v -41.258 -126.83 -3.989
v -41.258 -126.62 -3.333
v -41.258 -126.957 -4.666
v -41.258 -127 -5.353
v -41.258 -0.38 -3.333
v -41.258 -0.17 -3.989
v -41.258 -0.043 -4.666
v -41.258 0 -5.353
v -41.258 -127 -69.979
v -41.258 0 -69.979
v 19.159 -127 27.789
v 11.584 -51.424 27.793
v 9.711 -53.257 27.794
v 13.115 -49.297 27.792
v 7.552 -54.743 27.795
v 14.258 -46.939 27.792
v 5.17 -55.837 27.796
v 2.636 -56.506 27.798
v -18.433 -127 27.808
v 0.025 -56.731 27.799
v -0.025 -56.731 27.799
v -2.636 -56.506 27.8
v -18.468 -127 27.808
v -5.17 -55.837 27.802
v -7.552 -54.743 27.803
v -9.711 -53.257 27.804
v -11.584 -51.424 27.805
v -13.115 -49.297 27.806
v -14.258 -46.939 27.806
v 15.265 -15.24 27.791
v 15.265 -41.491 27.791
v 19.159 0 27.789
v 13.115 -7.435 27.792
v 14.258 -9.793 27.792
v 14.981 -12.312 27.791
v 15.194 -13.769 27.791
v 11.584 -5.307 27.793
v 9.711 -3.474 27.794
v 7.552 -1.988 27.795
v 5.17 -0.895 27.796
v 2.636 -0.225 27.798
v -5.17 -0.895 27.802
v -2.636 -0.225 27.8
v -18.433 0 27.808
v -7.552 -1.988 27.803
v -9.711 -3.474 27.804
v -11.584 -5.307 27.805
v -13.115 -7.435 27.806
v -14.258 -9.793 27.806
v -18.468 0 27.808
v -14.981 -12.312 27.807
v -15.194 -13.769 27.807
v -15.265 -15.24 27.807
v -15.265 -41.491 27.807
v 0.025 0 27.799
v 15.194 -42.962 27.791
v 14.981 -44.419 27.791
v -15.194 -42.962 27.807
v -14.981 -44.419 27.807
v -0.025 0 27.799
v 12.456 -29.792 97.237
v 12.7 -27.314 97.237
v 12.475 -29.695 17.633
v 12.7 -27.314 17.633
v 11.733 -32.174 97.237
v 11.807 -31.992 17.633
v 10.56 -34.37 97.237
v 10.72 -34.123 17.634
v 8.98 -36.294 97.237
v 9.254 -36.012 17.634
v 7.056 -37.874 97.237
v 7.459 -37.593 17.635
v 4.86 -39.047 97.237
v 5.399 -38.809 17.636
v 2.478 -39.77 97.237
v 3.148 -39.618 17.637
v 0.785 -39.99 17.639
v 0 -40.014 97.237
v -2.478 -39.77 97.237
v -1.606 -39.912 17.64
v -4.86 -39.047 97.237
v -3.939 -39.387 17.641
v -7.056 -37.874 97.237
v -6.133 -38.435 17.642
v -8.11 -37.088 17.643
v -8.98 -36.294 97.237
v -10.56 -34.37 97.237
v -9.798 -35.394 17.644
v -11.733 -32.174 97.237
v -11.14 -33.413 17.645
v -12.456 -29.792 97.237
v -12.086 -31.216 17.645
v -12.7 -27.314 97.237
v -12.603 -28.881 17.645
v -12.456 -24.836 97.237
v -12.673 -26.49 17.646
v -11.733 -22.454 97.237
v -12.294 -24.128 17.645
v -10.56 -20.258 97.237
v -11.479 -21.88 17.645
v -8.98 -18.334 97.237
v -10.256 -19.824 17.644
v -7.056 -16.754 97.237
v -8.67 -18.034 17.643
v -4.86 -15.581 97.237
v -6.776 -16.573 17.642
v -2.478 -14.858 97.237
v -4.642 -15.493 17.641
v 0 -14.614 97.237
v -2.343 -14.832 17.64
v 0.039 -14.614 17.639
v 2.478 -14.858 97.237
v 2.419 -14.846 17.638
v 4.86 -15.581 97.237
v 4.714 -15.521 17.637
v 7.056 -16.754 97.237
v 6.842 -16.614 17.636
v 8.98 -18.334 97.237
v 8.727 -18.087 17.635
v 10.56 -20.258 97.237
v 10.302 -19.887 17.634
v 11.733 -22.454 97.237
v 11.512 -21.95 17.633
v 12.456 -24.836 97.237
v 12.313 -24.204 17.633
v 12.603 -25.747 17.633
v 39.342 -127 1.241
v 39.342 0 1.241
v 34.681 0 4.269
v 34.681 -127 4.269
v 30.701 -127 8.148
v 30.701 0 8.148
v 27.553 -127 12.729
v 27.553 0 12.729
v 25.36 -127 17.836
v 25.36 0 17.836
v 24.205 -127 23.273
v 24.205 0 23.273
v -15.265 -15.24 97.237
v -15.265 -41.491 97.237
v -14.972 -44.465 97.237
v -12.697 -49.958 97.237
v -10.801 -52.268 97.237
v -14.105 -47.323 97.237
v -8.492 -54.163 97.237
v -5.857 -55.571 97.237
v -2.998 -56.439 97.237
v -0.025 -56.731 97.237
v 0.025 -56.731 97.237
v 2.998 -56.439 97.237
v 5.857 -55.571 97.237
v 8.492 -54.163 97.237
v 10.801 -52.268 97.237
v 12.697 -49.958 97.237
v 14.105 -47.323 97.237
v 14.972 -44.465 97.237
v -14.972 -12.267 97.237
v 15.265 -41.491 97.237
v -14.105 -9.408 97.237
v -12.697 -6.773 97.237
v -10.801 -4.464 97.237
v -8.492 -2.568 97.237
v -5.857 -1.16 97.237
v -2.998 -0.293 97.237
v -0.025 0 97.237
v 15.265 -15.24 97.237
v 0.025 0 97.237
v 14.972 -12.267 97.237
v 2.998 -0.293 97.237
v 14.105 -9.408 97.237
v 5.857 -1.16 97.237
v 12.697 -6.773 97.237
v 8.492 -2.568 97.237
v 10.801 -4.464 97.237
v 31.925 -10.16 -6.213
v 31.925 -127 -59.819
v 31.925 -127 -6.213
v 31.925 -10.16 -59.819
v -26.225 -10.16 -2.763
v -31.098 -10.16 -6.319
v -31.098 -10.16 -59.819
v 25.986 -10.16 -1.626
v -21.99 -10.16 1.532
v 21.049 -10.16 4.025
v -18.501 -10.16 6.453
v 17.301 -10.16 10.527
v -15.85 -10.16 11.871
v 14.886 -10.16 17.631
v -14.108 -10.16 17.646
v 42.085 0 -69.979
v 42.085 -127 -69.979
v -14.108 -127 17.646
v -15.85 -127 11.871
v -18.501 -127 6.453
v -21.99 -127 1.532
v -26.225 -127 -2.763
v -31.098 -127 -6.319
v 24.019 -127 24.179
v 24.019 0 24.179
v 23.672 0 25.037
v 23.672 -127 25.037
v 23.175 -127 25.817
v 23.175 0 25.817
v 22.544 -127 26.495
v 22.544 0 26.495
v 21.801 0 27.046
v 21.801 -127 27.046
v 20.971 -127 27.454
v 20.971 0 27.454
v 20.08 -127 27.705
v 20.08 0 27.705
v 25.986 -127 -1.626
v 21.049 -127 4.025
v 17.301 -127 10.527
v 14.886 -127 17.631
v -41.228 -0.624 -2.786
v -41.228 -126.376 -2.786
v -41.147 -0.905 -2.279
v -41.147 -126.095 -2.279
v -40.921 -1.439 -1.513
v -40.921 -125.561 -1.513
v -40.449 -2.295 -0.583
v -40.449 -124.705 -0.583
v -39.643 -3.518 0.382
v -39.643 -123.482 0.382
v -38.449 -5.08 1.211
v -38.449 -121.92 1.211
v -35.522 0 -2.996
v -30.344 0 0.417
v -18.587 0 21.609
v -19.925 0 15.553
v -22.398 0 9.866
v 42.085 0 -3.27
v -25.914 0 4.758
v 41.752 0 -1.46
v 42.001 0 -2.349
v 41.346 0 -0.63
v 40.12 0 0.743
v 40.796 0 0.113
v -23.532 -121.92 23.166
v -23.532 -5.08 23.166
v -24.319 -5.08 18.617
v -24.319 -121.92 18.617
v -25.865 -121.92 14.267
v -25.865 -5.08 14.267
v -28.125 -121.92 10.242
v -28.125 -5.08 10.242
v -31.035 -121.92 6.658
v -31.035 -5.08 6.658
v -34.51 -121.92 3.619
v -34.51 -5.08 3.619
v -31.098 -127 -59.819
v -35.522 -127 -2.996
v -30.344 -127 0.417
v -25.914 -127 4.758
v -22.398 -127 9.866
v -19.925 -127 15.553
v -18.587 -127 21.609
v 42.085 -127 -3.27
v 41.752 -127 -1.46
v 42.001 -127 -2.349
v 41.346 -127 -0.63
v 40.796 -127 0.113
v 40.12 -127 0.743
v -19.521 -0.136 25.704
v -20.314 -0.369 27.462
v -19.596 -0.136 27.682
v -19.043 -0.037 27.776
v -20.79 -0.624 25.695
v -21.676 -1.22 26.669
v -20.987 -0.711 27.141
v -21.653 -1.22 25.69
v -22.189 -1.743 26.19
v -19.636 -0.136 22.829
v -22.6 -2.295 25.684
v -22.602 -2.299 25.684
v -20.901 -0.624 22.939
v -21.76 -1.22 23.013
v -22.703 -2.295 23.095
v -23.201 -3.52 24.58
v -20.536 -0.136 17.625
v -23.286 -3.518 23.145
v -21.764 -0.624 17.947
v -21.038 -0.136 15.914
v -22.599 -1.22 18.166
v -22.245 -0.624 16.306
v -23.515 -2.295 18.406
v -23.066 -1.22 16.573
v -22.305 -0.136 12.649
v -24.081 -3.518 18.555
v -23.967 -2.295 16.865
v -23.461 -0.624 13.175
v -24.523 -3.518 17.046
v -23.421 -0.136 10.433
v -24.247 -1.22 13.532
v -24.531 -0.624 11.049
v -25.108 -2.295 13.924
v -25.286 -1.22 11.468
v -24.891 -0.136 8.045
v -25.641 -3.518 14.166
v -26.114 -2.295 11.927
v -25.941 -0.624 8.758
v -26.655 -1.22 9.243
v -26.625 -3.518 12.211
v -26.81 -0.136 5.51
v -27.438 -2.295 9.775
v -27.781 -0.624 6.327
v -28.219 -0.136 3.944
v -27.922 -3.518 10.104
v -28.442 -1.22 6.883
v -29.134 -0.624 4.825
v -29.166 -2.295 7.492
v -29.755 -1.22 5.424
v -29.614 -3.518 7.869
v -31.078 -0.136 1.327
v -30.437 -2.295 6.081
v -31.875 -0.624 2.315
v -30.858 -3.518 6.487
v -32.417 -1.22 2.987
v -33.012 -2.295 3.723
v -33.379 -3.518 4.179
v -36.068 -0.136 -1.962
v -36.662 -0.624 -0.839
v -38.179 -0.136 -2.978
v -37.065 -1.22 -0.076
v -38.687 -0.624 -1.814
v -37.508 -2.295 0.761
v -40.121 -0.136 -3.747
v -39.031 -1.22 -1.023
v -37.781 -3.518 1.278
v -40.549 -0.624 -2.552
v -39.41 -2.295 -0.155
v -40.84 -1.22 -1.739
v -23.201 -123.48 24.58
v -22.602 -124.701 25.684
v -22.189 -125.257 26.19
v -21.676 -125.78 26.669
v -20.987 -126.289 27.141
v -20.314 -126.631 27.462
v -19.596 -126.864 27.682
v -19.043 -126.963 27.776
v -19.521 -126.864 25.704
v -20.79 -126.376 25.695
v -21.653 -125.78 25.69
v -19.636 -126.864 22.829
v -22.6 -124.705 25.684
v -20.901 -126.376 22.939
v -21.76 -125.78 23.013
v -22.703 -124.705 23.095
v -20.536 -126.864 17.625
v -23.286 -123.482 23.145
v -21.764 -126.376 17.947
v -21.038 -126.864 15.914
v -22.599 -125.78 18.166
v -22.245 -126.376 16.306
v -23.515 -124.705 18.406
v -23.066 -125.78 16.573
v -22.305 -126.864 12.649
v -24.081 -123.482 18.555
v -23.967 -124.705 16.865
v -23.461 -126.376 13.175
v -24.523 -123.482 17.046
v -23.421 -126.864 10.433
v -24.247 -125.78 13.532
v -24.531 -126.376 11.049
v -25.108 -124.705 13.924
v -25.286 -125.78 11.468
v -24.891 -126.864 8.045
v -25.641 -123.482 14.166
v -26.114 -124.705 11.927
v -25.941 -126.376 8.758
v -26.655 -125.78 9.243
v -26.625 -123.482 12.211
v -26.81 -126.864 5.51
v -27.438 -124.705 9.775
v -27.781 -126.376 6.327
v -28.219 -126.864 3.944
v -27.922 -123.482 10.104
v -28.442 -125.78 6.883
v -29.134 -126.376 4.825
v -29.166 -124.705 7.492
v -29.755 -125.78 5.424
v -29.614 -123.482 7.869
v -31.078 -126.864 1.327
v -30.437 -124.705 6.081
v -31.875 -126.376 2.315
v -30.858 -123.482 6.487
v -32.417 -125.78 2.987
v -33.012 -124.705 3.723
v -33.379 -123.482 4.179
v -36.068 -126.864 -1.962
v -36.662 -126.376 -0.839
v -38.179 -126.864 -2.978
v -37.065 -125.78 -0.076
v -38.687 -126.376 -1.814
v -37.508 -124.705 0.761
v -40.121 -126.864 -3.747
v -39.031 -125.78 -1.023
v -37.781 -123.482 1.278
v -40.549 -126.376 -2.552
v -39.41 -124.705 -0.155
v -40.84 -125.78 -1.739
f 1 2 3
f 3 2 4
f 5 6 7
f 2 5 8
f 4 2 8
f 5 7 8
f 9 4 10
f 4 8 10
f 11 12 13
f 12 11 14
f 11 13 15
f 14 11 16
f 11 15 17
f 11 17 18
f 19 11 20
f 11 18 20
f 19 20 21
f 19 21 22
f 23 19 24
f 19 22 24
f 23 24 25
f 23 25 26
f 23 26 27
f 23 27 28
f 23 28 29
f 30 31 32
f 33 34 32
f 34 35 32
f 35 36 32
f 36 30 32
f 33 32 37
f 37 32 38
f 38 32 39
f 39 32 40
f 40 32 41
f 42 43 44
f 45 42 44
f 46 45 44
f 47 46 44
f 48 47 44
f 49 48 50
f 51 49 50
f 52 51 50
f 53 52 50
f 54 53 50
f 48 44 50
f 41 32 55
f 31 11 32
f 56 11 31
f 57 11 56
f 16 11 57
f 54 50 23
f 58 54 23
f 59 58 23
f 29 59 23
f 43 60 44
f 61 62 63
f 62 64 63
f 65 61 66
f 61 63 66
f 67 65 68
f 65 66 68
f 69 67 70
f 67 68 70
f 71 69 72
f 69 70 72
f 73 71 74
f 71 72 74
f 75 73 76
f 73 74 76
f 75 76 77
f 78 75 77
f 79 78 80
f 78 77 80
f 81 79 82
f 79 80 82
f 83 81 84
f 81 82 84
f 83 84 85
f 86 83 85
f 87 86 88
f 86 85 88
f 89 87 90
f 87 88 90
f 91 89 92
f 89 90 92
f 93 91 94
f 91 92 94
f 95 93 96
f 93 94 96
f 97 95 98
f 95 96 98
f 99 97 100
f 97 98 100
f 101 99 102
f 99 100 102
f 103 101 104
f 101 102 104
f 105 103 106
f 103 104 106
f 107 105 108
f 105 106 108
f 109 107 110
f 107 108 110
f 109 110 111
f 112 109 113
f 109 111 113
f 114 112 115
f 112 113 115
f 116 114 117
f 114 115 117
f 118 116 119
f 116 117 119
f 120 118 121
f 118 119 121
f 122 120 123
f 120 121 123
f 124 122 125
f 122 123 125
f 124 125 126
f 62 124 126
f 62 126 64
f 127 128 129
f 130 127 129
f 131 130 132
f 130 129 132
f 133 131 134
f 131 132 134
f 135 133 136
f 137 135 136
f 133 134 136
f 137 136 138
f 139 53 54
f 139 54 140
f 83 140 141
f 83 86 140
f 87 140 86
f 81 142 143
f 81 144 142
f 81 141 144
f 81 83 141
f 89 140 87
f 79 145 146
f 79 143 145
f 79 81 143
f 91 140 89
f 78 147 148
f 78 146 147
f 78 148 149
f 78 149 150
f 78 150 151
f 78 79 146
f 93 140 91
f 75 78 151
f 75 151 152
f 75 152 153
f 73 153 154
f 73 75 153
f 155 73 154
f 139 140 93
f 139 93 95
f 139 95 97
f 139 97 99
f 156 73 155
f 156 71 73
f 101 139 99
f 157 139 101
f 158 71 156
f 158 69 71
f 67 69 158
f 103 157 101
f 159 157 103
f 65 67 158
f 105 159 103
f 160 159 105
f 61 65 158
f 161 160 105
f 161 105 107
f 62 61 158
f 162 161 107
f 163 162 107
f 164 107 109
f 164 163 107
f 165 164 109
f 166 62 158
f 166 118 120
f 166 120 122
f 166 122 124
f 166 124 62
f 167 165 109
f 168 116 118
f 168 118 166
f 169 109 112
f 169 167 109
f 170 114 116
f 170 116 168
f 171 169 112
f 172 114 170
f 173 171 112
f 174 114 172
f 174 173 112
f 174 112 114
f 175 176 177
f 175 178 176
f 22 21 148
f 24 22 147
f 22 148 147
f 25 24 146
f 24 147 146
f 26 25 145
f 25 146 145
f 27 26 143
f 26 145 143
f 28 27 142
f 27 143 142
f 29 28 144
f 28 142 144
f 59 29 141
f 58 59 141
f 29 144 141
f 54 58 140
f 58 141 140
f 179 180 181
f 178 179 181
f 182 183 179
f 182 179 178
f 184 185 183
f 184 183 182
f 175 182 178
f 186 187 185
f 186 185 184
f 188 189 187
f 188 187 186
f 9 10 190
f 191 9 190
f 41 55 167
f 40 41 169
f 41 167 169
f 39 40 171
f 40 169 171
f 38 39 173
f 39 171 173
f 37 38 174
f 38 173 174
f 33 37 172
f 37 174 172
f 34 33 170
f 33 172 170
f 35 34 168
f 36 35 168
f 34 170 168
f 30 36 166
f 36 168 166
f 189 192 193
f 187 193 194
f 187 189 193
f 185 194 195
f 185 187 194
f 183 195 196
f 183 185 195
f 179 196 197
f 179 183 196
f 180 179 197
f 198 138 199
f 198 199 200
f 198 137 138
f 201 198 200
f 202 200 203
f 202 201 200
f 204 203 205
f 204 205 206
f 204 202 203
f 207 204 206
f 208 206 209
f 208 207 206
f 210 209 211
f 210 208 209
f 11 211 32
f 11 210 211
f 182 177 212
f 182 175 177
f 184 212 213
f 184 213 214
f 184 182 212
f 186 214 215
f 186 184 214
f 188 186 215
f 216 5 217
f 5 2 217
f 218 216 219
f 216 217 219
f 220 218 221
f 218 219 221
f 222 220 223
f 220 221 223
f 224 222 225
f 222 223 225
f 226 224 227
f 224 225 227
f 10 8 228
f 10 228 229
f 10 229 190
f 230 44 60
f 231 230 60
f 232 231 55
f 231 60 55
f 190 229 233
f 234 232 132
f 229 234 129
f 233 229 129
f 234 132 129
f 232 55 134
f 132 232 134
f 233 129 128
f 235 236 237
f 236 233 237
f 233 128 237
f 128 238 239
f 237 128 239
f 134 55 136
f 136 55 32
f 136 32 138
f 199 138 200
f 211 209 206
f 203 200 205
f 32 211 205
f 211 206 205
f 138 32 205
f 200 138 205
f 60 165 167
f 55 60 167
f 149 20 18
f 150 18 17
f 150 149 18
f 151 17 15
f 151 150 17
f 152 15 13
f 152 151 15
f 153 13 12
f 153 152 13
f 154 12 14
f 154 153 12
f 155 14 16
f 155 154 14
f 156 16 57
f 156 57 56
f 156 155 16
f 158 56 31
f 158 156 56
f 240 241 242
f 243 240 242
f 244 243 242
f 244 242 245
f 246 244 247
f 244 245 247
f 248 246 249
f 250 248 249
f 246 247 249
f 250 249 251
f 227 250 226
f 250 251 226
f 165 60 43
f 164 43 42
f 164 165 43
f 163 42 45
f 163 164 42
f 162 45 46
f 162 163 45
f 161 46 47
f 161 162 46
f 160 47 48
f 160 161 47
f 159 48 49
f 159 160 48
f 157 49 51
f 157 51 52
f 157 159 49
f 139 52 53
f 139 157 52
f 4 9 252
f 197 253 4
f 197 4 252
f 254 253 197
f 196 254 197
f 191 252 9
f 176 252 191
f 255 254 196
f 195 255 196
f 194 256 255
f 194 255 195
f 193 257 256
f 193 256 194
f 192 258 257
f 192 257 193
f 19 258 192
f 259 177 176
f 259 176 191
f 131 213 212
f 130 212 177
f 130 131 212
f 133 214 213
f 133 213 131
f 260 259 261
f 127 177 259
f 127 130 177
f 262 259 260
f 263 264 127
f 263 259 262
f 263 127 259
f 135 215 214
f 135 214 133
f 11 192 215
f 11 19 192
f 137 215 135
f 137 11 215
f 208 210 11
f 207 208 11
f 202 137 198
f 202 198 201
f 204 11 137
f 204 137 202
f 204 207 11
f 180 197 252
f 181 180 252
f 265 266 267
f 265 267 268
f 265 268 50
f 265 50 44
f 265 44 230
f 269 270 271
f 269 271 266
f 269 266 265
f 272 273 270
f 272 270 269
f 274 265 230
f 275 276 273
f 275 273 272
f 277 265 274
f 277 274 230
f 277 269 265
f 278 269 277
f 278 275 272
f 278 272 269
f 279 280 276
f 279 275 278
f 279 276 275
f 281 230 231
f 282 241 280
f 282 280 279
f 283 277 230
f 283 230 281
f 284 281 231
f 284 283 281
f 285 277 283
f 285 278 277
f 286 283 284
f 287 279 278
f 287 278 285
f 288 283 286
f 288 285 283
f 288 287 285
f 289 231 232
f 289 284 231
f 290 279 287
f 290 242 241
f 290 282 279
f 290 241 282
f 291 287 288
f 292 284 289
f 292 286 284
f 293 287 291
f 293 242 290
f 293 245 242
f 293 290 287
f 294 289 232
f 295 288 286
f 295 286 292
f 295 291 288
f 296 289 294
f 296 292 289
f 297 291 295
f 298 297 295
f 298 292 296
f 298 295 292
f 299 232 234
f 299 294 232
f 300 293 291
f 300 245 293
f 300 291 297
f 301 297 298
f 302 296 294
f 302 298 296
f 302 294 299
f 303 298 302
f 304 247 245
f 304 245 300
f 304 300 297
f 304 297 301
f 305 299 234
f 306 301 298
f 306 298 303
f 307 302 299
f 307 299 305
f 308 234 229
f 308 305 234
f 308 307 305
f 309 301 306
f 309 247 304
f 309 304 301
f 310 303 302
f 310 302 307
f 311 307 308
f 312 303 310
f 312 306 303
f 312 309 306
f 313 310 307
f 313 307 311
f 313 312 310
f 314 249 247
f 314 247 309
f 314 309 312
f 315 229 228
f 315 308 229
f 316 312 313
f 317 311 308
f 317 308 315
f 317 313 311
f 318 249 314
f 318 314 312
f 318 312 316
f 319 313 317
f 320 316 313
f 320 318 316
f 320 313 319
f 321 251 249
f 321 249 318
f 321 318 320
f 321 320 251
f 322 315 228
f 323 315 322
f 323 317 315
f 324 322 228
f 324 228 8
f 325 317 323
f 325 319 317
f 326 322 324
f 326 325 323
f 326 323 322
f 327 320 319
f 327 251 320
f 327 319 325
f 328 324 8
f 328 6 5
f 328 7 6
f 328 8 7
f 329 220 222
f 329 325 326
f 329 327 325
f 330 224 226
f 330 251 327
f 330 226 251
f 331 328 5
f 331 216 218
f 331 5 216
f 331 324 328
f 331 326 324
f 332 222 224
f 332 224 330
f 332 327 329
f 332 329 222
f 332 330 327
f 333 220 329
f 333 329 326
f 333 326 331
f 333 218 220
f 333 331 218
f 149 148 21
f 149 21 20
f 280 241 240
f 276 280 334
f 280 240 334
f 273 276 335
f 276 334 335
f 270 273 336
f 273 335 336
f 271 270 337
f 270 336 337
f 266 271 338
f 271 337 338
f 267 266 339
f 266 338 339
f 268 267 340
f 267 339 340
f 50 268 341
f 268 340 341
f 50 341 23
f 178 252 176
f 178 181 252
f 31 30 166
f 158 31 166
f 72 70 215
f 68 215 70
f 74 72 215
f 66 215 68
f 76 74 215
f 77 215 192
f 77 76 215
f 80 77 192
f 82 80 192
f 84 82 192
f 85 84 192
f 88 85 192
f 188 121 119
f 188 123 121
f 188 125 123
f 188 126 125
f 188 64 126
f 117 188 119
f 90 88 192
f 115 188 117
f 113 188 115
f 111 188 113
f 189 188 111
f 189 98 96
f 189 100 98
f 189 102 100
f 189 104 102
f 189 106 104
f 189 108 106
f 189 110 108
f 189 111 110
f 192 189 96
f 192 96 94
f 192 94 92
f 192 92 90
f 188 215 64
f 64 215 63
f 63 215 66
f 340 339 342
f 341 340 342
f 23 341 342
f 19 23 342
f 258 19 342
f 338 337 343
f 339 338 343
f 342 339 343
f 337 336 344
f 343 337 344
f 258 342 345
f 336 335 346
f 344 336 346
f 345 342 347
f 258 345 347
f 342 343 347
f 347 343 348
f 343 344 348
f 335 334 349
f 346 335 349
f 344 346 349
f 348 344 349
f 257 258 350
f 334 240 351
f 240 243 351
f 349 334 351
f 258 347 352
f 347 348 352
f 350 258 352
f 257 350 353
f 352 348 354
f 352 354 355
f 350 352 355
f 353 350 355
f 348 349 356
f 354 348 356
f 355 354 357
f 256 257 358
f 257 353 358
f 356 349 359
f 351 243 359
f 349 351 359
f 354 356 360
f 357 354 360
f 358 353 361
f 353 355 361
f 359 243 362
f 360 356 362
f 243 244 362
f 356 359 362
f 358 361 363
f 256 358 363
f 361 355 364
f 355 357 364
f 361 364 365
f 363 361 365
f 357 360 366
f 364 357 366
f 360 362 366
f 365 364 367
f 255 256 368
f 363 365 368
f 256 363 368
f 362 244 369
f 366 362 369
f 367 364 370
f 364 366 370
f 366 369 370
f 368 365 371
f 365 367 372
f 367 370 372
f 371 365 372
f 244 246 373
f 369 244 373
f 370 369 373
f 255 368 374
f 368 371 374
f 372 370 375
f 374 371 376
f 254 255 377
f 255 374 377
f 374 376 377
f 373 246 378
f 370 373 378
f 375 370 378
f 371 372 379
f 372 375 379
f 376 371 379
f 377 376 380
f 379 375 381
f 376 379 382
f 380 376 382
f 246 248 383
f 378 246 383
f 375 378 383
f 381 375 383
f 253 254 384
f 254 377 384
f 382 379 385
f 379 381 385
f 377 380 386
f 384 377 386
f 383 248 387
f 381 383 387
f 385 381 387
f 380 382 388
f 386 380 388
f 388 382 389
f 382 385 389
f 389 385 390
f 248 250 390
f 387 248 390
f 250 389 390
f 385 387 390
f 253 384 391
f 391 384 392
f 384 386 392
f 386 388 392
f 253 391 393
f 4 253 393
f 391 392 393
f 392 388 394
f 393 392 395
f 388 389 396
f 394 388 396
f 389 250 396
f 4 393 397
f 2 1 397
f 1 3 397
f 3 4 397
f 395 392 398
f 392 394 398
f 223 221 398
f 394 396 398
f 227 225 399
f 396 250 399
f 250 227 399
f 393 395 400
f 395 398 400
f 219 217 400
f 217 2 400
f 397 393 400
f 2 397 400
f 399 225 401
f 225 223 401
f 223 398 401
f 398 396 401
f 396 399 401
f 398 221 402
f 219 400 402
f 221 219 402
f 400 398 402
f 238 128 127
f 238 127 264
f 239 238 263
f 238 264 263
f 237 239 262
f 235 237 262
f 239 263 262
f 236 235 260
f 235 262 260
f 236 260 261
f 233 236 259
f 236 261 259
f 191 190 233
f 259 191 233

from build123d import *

# Parameters (mm, degrees)
F1_DEPTH = 127
F2_T     = -10.16
F4_D     = 25.4
F4_DEPTH = 27.81203442
F5_W     = 30.5300801992
F5_H     = 70.8724632859
F6_DEPTH = 56.7313879728
F7_D     = 25.4
F7_DEPTH = 97.2380505333
F8_R     = 15.24
F9_R     = 5.08


with BuildPart() as f1:
    # F0 (on Front) → F1 (new body)
    with BuildSketch(Plane.XZ):
        with BuildLine():
            Line((-41.2577867825, 0), (-41.2577867825, -69.9788480997))
            Line((-41.2577867825, -69.9788480997), (42.0852601528, -69.9788480997))
            Line((42.0852601528, -69.9788480997), (42.0852601528, 0))
            ThreePointArc((42.0852601528, 0), (28.5956049165, 10.9886772048), (24.0628808213, 27.7867794006))
            Line((24.0628808213, 27.7867794006), (-23.52851646, 27.81103442))
            ThreePointArc((-23.52851646, 27.81103442), (-27.6884119308, 10.9062903381), (-41.2577867825, 0))
        make_face()
    extrude(amount=F1_DEPTH)

    # F2
    f2_openings = [f1.faces().sort_by_distance(p)[0] for p in [
        (0.418317, -127, -24.869702),
    ]]
    offset(amount=F2_T, openings=f2_openings)

    # F4 (through all, one way)
    with BuildSketch(Plane(origin=(0, 0, 0), x_dir=(1, 0, 0), z_dir=(0, 0, -1))):
        with Locations((0, 27.3138843477)):
            Circle(F4_D / 2)
    extrude(amount=-F4_DEPTH, mode=Mode.SUBTRACT)

    # F5 (on Front) → F6 (join)
    with BuildSketch(Plane.XZ):
        with Locations((0, 61.8008188903)):
            Rectangle(F5_W, F5_H)
    extrude(amount=F6_DEPTH)

    # F7 (through all, one way)
    with BuildSketch(Plane(origin=(0, 0, 0), x_dir=(1, 0, 0), z_dir=(0, 0, -1))):
        with Locations((0, 27.3138843477)):
            Circle(F7_D / 2)
    extrude(amount=-F7_DEPTH, mode=Mode.SUBTRACT)

    # F8
    f8_edges = [f1.edges().sort_by_distance(p)[0] for p in [
        (15.26504, 0, 62.514157),
        (-15.26504, 0, 62.521937),
        (15.26504, -56.731388, 62.514157),
        (-15.26504, -56.731388, 62.521937),
    ]]
    fillet(f8_edges, radius=F8_R)

    # F9
    f9_edges = [f1.edges().sort_by_distance(p)[0] for p in [
        (42.08526, -63.5, 0),
        (24.062881, -63.5, 27.786779),
        (-23.528516, -63.5, 27.811034),
        (-41.257787, -63.5, 0),
        (-27.688412, 0, 10.90629),
        (-27.688412, -127, 10.90629),
    ]]
    fillet(f9_edges, radius=F9_R)


solid = f1.part
